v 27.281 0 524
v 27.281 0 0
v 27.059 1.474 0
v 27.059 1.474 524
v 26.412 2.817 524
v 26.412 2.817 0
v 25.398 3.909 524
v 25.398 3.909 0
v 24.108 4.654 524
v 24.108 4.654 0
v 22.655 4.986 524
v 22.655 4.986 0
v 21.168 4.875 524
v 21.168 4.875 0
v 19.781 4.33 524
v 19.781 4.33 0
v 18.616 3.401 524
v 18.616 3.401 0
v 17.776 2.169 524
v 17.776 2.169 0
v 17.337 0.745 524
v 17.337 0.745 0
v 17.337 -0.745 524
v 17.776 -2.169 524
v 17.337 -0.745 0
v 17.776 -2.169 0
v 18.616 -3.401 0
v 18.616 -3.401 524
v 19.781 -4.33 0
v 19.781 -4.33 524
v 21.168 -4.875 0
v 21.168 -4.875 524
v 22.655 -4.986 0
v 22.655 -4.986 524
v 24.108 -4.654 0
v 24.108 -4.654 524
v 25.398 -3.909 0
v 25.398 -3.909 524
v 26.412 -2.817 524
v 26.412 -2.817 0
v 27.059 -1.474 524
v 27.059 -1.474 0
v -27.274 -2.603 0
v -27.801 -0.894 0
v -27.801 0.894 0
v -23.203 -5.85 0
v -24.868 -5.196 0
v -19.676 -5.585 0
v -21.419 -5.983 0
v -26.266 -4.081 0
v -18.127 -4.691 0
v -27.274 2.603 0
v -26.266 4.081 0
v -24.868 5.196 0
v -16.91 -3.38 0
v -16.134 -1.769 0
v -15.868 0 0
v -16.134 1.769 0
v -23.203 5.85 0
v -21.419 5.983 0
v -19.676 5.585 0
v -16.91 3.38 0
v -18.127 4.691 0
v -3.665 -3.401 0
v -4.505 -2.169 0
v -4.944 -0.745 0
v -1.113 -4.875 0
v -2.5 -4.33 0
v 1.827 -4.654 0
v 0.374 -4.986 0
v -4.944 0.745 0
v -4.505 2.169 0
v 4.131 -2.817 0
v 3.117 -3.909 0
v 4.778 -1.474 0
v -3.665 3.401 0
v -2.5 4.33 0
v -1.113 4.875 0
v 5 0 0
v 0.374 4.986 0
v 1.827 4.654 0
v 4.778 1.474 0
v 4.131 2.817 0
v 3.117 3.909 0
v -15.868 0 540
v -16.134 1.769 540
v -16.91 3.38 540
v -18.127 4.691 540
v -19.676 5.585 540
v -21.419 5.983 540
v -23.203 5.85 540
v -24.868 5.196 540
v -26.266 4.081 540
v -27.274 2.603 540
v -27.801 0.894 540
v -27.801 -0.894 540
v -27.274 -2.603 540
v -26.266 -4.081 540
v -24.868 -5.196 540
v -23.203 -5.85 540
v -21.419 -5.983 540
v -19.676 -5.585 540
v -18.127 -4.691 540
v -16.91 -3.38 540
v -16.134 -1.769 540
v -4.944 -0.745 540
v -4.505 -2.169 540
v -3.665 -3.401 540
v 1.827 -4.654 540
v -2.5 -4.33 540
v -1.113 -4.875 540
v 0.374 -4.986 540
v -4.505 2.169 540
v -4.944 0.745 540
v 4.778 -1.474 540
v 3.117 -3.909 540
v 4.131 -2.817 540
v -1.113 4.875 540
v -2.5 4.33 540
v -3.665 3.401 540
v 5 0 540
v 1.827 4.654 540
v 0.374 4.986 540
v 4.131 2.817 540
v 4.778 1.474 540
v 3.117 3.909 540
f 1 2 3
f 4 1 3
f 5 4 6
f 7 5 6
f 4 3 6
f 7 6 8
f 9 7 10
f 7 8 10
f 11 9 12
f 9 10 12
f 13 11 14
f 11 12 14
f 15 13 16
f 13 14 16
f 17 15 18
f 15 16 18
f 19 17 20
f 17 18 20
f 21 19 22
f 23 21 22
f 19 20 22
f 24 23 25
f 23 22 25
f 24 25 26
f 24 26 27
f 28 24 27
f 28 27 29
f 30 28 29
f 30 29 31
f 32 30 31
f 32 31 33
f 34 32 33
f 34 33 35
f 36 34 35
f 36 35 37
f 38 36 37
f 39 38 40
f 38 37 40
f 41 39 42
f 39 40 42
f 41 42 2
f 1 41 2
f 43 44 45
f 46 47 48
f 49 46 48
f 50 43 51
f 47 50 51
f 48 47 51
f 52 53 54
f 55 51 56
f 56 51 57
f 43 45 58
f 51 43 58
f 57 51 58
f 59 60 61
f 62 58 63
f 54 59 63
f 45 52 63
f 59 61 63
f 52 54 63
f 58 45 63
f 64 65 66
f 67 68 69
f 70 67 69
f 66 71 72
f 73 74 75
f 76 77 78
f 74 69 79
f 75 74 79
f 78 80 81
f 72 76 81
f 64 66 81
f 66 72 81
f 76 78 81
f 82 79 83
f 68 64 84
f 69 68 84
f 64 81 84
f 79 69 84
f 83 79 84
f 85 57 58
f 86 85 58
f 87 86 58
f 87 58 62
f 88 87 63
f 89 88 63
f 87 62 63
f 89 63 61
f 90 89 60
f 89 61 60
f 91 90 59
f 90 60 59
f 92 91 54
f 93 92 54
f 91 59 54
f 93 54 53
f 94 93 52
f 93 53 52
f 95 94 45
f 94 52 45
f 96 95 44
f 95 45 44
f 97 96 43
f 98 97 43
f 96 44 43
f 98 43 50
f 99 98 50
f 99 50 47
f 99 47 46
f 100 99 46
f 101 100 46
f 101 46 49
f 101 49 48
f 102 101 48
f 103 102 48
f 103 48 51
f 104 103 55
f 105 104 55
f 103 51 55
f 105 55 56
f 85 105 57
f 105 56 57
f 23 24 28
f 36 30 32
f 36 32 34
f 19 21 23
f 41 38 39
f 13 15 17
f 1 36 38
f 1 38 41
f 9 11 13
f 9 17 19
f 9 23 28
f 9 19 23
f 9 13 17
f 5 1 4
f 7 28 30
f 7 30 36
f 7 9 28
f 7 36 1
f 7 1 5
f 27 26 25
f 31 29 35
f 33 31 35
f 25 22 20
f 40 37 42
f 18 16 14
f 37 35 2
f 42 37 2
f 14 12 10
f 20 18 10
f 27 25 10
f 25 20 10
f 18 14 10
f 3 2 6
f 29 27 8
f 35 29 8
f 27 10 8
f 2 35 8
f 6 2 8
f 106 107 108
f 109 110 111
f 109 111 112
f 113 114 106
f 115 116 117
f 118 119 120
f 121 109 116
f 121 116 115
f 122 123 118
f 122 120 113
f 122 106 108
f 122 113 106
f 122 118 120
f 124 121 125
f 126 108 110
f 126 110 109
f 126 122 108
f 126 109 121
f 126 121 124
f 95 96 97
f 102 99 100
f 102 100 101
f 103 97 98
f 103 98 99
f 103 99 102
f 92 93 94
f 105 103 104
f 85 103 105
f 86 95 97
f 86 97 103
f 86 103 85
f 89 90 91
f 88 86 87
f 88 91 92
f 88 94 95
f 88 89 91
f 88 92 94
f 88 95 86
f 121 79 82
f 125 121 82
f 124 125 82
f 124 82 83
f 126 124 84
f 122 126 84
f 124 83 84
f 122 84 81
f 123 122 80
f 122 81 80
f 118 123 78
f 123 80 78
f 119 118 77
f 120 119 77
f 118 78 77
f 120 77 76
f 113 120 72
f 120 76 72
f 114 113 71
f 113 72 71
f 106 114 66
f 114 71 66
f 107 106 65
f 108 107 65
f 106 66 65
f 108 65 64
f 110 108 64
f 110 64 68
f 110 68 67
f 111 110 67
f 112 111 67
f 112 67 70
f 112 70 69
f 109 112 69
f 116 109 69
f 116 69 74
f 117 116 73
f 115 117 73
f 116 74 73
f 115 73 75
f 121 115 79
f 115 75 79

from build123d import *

# Parameters (mm, degrees)
F0_R     = 5
F1_DEPTH = 540
F2_R     = 5
F3_DEPTH = 524
F4_R     = 6
F5_DEPTH = 540


with BuildPart() as f1:
    # F0 (on Top) → F1 (new body)
    with BuildSketch(Plane.XY):
        Circle(F0_R)
    extrude(amount=F1_DEPTH)


with BuildPart() as f3:
    # F2 (on Top) → F3 (new body)
    with BuildSketch(Plane.XY):
        with Locations((22.28093, 0)):
            Circle(F2_R)
    extrude(amount=F3_DEPTH)


with BuildPart() as f5:
    # F4 (on Top) → F5 (new body)
    with BuildSketch(Plane.XY):
        with Locations((-21.867782, 0)):
            Circle(F4_R)
    extrude(amount=F5_DEPTH)


solid = Compound([f1.part, f3.part, f5.part])
